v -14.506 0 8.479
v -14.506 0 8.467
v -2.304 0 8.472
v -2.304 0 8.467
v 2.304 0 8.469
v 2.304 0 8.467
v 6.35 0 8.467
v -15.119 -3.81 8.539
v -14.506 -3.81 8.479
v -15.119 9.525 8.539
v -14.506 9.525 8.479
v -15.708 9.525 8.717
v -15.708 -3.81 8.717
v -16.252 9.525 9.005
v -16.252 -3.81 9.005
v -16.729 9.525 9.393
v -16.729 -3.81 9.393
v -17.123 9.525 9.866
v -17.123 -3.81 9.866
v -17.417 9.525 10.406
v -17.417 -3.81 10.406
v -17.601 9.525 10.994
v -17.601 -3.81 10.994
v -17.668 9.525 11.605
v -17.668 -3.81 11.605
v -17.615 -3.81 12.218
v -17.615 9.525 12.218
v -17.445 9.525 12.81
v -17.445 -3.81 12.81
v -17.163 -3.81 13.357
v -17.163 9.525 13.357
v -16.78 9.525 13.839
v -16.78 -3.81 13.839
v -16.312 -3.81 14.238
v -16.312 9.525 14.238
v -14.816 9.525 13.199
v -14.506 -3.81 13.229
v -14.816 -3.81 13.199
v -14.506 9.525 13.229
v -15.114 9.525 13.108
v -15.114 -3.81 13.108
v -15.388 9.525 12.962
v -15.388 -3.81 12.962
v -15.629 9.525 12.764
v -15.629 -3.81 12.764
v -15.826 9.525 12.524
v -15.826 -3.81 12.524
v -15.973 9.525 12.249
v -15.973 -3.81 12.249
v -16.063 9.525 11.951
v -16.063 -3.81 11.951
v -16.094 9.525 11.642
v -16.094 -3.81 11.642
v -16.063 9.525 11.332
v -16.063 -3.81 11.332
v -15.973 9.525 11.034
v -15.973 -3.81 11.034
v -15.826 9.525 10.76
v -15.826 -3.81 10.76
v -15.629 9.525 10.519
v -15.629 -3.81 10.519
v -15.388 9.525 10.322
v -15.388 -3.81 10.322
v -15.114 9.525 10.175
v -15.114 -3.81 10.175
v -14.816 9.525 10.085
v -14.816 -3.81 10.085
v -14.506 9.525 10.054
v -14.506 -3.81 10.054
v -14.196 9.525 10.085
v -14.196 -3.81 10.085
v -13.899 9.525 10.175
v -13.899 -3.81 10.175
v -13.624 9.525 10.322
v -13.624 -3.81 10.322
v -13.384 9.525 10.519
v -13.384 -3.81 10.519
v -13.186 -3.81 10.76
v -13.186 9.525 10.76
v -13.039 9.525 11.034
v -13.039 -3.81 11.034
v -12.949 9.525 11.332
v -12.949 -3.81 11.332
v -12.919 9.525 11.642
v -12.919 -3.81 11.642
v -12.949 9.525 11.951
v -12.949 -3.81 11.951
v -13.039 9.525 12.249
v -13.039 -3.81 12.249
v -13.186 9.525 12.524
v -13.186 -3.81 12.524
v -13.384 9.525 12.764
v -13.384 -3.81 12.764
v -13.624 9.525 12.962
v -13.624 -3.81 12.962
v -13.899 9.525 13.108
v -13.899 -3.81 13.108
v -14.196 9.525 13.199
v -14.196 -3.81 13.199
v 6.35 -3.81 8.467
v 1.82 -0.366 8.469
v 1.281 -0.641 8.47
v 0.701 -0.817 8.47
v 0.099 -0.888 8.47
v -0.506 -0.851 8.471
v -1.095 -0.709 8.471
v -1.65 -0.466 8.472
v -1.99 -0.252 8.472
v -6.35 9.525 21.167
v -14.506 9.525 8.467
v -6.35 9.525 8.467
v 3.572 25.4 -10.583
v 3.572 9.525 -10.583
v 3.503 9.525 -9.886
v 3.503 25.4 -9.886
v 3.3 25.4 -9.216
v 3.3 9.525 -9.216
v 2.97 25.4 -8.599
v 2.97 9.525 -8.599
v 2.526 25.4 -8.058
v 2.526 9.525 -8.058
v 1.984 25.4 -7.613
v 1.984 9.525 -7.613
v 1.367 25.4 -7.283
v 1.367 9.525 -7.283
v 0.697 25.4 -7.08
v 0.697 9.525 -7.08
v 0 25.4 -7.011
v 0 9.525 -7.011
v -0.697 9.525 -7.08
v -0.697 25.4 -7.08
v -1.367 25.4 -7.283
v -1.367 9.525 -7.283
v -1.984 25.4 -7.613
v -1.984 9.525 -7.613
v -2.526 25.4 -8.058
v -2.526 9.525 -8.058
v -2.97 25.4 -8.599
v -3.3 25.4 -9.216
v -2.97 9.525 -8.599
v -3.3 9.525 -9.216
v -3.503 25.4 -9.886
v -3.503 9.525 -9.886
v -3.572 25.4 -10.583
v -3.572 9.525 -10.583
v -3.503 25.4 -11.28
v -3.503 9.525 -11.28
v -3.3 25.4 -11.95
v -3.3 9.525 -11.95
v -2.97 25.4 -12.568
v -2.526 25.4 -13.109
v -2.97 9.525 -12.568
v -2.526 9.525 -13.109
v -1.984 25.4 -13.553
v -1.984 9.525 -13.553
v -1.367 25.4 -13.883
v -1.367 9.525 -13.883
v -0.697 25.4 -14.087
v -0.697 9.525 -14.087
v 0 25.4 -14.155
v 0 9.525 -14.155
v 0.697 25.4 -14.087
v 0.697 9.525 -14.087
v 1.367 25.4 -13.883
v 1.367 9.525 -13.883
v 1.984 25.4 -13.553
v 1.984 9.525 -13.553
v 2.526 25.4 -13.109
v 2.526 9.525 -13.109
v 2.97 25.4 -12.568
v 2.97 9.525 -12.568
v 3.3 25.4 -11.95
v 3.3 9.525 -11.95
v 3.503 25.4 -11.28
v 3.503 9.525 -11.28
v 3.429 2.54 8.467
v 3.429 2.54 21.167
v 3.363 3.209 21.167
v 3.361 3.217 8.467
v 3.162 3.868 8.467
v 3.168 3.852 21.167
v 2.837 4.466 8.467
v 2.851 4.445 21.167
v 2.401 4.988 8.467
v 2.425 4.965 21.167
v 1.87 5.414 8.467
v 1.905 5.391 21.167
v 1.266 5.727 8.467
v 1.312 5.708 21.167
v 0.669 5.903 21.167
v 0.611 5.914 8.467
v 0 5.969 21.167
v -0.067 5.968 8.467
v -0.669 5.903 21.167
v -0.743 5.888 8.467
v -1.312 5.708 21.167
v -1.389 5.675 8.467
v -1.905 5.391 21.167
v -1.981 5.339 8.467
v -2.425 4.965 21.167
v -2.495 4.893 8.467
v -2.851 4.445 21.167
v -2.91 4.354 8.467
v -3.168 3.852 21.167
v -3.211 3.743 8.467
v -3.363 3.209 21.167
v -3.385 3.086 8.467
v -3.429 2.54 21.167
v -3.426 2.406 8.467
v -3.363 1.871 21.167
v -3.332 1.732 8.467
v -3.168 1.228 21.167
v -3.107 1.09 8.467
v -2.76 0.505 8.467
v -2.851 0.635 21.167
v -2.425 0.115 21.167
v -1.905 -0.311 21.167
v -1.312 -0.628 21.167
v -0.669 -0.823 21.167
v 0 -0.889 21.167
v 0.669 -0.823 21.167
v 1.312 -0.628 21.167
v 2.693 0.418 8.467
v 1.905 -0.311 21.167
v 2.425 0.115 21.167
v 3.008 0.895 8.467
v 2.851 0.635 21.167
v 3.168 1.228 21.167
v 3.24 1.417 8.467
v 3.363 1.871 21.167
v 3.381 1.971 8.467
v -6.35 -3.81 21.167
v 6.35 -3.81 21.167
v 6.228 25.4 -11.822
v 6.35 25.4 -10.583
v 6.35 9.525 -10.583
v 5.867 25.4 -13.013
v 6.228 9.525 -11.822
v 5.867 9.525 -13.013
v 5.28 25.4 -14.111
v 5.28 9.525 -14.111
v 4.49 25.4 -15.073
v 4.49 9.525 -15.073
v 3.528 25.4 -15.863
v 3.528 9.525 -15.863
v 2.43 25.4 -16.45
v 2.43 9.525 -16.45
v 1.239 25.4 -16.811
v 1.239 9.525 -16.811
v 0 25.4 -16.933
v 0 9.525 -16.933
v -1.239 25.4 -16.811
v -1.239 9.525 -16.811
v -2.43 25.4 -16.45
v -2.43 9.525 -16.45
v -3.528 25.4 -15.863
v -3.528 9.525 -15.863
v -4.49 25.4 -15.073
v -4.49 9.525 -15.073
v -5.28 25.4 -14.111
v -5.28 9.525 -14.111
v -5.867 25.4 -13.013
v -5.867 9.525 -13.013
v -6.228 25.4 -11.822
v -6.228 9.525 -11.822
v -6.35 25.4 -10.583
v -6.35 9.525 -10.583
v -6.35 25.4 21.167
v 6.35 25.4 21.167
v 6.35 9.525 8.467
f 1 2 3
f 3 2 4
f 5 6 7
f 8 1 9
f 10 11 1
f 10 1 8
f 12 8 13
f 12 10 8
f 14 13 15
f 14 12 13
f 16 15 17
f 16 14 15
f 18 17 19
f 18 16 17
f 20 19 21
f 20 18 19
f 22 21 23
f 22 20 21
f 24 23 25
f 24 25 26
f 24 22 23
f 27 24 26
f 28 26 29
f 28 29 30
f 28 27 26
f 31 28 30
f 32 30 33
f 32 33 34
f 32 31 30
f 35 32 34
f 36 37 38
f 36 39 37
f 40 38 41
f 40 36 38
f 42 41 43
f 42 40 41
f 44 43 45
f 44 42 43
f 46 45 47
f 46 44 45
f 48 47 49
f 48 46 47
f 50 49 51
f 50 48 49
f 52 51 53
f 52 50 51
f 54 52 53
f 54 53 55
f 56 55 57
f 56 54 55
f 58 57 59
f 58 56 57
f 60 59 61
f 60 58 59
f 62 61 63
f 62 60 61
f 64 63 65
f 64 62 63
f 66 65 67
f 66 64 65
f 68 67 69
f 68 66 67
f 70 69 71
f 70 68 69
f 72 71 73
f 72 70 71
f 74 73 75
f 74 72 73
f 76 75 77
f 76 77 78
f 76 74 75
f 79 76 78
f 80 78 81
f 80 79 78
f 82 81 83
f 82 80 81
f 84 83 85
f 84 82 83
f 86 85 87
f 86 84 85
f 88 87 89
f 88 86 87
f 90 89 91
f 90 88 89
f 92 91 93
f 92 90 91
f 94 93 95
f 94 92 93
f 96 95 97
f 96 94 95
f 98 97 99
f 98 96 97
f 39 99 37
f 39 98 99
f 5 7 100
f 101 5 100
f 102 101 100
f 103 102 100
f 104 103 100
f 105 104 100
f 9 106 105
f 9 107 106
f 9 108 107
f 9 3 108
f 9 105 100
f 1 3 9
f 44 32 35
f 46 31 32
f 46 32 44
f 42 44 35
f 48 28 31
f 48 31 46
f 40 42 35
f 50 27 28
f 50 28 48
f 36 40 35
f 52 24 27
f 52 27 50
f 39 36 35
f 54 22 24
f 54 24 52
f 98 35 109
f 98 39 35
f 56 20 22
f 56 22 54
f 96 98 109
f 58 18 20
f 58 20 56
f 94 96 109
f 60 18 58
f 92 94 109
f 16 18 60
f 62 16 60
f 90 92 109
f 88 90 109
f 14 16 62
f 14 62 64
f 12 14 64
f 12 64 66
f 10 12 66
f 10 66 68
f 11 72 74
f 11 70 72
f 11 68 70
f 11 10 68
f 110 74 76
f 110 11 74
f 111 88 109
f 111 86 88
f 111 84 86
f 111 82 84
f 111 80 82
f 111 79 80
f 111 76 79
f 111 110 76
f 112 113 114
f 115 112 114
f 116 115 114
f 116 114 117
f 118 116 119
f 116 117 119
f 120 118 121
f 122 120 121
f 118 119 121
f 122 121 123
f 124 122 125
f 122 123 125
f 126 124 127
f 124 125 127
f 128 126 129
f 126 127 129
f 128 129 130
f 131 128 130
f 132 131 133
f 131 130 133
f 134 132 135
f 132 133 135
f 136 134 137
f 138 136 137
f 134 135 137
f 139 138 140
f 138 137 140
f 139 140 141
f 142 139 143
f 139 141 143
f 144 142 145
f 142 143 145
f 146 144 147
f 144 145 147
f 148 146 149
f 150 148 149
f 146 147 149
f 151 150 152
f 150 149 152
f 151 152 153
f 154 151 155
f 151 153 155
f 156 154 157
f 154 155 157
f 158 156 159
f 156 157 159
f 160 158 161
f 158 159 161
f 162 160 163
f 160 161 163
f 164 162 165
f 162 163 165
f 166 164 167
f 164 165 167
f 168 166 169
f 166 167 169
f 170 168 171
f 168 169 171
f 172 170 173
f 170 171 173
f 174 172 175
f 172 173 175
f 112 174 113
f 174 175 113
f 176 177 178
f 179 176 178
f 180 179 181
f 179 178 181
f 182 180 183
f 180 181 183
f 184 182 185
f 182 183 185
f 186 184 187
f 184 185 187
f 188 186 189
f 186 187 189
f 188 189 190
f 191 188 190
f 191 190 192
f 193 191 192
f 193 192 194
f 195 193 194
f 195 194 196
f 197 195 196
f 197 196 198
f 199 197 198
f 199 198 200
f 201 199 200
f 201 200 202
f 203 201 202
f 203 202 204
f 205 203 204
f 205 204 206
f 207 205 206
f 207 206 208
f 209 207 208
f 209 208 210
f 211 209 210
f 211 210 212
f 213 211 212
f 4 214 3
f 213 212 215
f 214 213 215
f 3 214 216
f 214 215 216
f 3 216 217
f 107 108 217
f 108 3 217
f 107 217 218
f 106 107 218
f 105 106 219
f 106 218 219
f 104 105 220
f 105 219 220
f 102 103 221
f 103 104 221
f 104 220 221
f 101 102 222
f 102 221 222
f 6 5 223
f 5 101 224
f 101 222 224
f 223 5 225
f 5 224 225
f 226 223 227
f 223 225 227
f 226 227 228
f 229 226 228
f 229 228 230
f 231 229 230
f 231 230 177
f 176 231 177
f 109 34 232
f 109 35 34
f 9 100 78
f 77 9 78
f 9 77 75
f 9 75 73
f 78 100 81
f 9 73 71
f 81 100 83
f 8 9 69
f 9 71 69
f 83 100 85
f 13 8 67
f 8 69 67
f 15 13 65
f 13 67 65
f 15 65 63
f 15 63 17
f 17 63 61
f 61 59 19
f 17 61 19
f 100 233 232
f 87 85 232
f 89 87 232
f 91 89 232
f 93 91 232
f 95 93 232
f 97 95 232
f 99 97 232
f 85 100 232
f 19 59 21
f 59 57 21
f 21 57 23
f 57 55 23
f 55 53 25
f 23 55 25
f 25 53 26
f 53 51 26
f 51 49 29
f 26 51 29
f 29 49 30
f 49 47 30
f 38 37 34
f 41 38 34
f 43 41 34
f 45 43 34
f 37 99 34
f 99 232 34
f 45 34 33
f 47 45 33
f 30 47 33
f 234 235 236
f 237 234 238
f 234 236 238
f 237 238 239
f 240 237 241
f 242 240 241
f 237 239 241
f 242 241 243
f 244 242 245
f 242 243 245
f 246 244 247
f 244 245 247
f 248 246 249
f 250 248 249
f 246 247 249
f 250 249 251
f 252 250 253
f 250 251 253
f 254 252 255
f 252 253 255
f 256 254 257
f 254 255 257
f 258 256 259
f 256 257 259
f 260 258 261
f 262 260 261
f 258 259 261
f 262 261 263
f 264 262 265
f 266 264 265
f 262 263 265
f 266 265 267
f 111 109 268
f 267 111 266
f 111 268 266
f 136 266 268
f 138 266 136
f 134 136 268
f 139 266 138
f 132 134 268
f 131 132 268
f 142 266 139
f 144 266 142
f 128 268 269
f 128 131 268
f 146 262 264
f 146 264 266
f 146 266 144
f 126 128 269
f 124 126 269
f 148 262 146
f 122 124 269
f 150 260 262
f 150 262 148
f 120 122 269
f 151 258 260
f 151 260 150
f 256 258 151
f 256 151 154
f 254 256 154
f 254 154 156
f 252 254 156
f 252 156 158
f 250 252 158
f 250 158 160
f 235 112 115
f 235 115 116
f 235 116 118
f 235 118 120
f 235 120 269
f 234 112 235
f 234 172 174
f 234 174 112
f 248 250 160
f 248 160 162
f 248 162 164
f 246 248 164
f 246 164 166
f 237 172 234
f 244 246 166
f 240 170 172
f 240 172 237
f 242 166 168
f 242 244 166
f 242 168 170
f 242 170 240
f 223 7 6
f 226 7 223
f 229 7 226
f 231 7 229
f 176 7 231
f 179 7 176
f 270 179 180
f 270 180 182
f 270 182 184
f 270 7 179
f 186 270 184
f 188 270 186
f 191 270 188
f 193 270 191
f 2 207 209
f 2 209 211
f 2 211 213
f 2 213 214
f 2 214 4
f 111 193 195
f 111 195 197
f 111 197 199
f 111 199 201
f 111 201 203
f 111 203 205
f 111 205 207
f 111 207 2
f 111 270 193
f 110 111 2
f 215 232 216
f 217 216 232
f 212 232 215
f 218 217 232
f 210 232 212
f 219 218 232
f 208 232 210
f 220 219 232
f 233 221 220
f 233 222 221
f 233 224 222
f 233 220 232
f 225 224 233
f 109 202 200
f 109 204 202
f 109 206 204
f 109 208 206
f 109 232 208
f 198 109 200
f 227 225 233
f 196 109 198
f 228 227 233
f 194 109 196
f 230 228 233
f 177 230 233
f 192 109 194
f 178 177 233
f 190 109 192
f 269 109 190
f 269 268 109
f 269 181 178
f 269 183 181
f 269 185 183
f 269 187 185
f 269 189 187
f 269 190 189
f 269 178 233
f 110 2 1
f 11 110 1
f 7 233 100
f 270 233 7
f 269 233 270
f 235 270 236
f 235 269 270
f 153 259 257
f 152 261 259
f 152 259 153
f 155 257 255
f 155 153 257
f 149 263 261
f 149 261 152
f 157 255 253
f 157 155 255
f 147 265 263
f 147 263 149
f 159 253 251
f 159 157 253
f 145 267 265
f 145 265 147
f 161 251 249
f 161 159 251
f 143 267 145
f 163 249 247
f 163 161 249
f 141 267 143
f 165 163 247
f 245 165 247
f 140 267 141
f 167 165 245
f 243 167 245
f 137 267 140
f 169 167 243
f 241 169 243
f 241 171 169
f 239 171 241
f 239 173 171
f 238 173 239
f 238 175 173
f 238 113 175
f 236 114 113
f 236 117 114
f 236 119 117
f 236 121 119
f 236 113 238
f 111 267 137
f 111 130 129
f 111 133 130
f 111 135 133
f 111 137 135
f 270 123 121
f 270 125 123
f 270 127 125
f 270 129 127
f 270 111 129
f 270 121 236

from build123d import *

# Parameters (mm, degrees)
BOSS_EXTRUDE4_DEPTH = 25.4
CUT_EXTRUDE1_REACH  = 35.668
SKETCH7_R           = 3.175
SKETCH9_W           = 14.069203901
SKETCH9_H           = 9.525
CUT_EXTRUDE2_DEPTH  = 25.4
SKETCH10_W          = 12.7
SKETCH10_H          = 9.525
BOSS_EXTRUDE5_DEPTH = 12.7
SKETCH11_R          = 1.5875
CUT_EXTRUDE3_DEPTH  = 12.7
SKETCH13_W          = 13.214088126
SKETCH13_H          = 21.166666667
CUT_EXTRUDE5_DEPTH  = 9.525
SKETCH14_W          = 12.7
SKETCH14_H          = 9.525
BOSS_EXTRUDE6_DEPTH = 12.7
CUT_EXTRUDE7_DEPTH  = 12.7
BOSS_EXTRUDE7_DEPTH = 9.525
SKETCH17_R          = 3.175
BOSS_EXTRUDE8_DEPTH = 15.875
SKETCH18_R          = 3.571875
CUT_EXTRUDE8_DEPTH  = 15.875
SKETCH19_R          = 1.587499998
CUT_EXTRUDE9_DEPTH  = 15.875
SKETCH20_R          = 1.587499998
BOSS_EXTRUDE9_DEPTH = 3.81
SKETCH21_R          = 3.429
CUT_EXTRUDE10_DEPTH = 12.7


with BuildPart() as part:
    # Sketch6 → Boss-Extrude4 (new body)
    with BuildSketch(Plane(origin=(0, 0, 0), x_dir=(1, 0, 0), z_dir=(0, 1, 0))):
        with BuildLine():
            Line((-6.35, -21.166666667), (6.35, -21.166666667))
            Line((6.35, -21.166666667), (6.35, 10.583333333))
            ThreePointArc((6.35, 10.583333333), (0, 16.933333333), (-6.35, 10.583333333))
            Line((-6.35, 10.583333333), (-6.35, -21.166666667))
        make_face()
    extrude(amount=BOSS_EXTRUDE4_DEPTH)

    # Sketch7 → Cut-Extrude1 (cut, up to next)
    with BuildSketch(Plane.XZ, mode=Mode.PRIVATE) as cut_extrude1_sk1:
        with Locations(Location((0, -10.583333333, 0), (0, 0, 270))):
            Circle(SKETCH7_R)
    cut_extrude1_tool1 = extrude(cut_extrude1_sk1.sketch, amount=-CUT_EXTRUDE1_REACH, mode=Mode.PRIVATE) & part.part
    add(cut_extrude1_tool1.solids().sort_by_distance((0, 0, -10.583333))[0], mode=Mode.SUBTRACT)

    # Sketch9 → Cut-Extrude2 (cut)
    with BuildSketch(Plane.XY.offset(-16.933333333)):
        with Locations((0.122145241, 4.7625)):
            Rectangle(SKETCH9_W, SKETCH9_H)
    extrude(amount=CUT_EXTRUDE2_DEPTH, mode=Mode.SUBTRACT)

    # Sketch10 → Boss-Extrude5 (add)
    with BuildSketch(Plane(origin=(6.35, 0, 0), x_dir=(0, 0, -1), z_dir=(1, 0, 0))):
        with Locations((-14.816666667, 4.7625)):
            Rectangle(SKETCH10_W, SKETCH10_H)
    extrude(amount=BOSS_EXTRUDE5_DEPTH)

    # Sketch11 → Cut-Extrude3 (cut)
    with BuildSketch(Plane(origin=(0, 9.525, 0), x_dir=(1, 0, 0), z_dir=(0, 1, 0))):
        with BuildLine():
            ThreePointArc((15.875, -8.466666667), (15.927897388, -8.467107348), (15.980780092, -8.468429271))
            ThreePointArc((15.980780092, -8.468429271), (18.157156523, -9.434318347), (19.05, -11.641666667))
            Line((19.05, -11.641666667), (19.05, -8.466666667))
            Line((19.05, -8.466666667), (15.875, -8.466666667))
        make_face()
        with BuildLine():
            Line((12.847839644, -12.599228768), (6.35, -21.166666667))
            Line((6.35, -21.166666667), (19.05, -21.166666667))
            Line((19.05, -21.166666667), (19.05, -11.641666667))
            ThreePointArc((19.05, -11.641666667), (16.359453749, -14.779489091), (12.847839644, -12.599228768))
        make_face()
        with Locations(Location((15.875, -11.641666667, 0), (0, 0, 270))):
            Circle(SKETCH11_R)
    extrude(amount=-CUT_EXTRUDE3_DEPTH, mode=Mode.SUBTRACT)

    # Sketch13 → Cut-Extrude5 (cut)
    with BuildSketch(Plane(origin=(0, 9.525, 0), x_dir=(1, 0, 0), z_dir=(0, 1, 0))):
        with Locations((12.957044063, -10.583333334)):
            Rectangle(SKETCH13_W, SKETCH13_H)
    extrude(amount=-CUT_EXTRUDE5_DEPTH, mode=Mode.SUBTRACT)

    # Sketch14 → Boss-Extrude6 (add)
    with BuildSketch(Plane.ZY.offset(6.35)):
        with Locations((14.816666667, 4.7625)):
            Rectangle(SKETCH14_W, SKETCH14_H)
    extrude(amount=BOSS_EXTRUDE6_DEPTH)

    # Sketch15 → Cut-Extrude7 (cut)
    with BuildSketch(Plane(origin=(0, 9.525, 0), x_dir=(1, 0, 0), z_dir=(0, 1, 0))):
        Polygon((-6.35, -8.466666667), (-14.506048031, -8.466666667), (-19.05, -8.466666667), (-19.05, -21.166666667), (-6.35, -21.166666667), align=None)
    extrude(amount=-CUT_EXTRUDE7_DEPTH, mode=Mode.SUBTRACT)

    # Sketch16 → Boss-Extrude7 (add)
    with BuildSketch(Plane(origin=(0, 9.525, 0), x_dir=(1, 0, 0), z_dir=(0, 1, 0))):
        Polygon((-17.681048031, -21.166666667), (-6.35, -21.166666667), (-6.35, -8.466666667), (-13.303781858, -8.466666667), (-17.681048031, -8.466666667), (-17.681048031, -11.641666667), align=None)
    extrude(amount=-BOSS_EXTRUDE7_DEPTH)

    # Sketch17 → Boss-Extrude8 (add)
    with BuildSketch(Plane.XZ.offset(-9.525)):
        with Locations((0, -10.583333333)):
            Circle(SKETCH17_R)
    extrude(amount=-BOSS_EXTRUDE8_DEPTH)

    # Sketch18 → Cut-Extrude8 (cut)
    with BuildSketch(Plane.XZ.offset(-9.525)):
        with Locations((0, -10.583333333)):
            Circle(SKETCH18_R)
    extrude(amount=-CUT_EXTRUDE8_DEPTH, mode=Mode.SUBTRACT)

    # Sketch19 → Cut-Extrude9 (cut)
    with BuildSketch(Plane(origin=(0, 9.525, 0), x_dir=(1, 0, 0), z_dir=(0, 1, 0))):
        with Locations(Location((-14.50604803, -11.641666664, 0), (0, 0, 270))):
            Circle(SKETCH19_R)
        with BuildLine():
            Line((-17.681048031, -8.466666667), (-14.50604803, -8.466666667))
            Line((-14.50604803, -8.466666667), (-14.50604803, -8.479366664))
            ThreePointArc((-14.50604803, -8.479366664), (-17.523471535, -10.695465482), (-16.311752542, -14.237735328))
            Line((-16.311752542, -14.237735328), (-6.35, -21.166666667))
            Line((-6.35, -21.166666667), (-17.681048031, -21.166666667))
            Line((-17.681048031, -21.166666667), (-17.681048031, -8.466666667))
        make_face()
    extrude(amount=-CUT_EXTRUDE9_DEPTH, mode=Mode.SUBTRACT)

    # Sketch20 → Boss-Extrude9 (add)
    with BuildSketch(Plane.XZ):
        with BuildLine():
            Line((-6.35, 21.166666667), (6.35, 21.166666667))
            Line((6.35, 21.166666667), (6.35, 8.466666667))
            Line((6.35, 8.466666667), (-14.50604803, 8.479366664))
            ThreePointArc((-14.50604803, 8.479366664), (-17.523471535, 10.695465482), (-16.311752542, 14.237735328))
            Line((-16.311752542, 14.237735328), (-6.35, 21.166666667))
        make_face()
        with Locations(Location((-14.50604803, 11.641666664, 0), (0, 0, 90))):
            Circle(SKETCH20_R, mode=Mode.SUBTRACT)
    extrude(amount=BOSS_EXTRUDE9_DEPTH)

    # Sketch21 → Cut-Extrude10 (cut)
    with BuildSketch(Plane.XY.offset(21.166666667)):
        with Locations((0, 2.54)):
            Circle(SKETCH21_R)
    extrude(amount=-CUT_EXTRUDE10_DEPTH, mode=Mode.SUBTRACT)


solid = part.part
